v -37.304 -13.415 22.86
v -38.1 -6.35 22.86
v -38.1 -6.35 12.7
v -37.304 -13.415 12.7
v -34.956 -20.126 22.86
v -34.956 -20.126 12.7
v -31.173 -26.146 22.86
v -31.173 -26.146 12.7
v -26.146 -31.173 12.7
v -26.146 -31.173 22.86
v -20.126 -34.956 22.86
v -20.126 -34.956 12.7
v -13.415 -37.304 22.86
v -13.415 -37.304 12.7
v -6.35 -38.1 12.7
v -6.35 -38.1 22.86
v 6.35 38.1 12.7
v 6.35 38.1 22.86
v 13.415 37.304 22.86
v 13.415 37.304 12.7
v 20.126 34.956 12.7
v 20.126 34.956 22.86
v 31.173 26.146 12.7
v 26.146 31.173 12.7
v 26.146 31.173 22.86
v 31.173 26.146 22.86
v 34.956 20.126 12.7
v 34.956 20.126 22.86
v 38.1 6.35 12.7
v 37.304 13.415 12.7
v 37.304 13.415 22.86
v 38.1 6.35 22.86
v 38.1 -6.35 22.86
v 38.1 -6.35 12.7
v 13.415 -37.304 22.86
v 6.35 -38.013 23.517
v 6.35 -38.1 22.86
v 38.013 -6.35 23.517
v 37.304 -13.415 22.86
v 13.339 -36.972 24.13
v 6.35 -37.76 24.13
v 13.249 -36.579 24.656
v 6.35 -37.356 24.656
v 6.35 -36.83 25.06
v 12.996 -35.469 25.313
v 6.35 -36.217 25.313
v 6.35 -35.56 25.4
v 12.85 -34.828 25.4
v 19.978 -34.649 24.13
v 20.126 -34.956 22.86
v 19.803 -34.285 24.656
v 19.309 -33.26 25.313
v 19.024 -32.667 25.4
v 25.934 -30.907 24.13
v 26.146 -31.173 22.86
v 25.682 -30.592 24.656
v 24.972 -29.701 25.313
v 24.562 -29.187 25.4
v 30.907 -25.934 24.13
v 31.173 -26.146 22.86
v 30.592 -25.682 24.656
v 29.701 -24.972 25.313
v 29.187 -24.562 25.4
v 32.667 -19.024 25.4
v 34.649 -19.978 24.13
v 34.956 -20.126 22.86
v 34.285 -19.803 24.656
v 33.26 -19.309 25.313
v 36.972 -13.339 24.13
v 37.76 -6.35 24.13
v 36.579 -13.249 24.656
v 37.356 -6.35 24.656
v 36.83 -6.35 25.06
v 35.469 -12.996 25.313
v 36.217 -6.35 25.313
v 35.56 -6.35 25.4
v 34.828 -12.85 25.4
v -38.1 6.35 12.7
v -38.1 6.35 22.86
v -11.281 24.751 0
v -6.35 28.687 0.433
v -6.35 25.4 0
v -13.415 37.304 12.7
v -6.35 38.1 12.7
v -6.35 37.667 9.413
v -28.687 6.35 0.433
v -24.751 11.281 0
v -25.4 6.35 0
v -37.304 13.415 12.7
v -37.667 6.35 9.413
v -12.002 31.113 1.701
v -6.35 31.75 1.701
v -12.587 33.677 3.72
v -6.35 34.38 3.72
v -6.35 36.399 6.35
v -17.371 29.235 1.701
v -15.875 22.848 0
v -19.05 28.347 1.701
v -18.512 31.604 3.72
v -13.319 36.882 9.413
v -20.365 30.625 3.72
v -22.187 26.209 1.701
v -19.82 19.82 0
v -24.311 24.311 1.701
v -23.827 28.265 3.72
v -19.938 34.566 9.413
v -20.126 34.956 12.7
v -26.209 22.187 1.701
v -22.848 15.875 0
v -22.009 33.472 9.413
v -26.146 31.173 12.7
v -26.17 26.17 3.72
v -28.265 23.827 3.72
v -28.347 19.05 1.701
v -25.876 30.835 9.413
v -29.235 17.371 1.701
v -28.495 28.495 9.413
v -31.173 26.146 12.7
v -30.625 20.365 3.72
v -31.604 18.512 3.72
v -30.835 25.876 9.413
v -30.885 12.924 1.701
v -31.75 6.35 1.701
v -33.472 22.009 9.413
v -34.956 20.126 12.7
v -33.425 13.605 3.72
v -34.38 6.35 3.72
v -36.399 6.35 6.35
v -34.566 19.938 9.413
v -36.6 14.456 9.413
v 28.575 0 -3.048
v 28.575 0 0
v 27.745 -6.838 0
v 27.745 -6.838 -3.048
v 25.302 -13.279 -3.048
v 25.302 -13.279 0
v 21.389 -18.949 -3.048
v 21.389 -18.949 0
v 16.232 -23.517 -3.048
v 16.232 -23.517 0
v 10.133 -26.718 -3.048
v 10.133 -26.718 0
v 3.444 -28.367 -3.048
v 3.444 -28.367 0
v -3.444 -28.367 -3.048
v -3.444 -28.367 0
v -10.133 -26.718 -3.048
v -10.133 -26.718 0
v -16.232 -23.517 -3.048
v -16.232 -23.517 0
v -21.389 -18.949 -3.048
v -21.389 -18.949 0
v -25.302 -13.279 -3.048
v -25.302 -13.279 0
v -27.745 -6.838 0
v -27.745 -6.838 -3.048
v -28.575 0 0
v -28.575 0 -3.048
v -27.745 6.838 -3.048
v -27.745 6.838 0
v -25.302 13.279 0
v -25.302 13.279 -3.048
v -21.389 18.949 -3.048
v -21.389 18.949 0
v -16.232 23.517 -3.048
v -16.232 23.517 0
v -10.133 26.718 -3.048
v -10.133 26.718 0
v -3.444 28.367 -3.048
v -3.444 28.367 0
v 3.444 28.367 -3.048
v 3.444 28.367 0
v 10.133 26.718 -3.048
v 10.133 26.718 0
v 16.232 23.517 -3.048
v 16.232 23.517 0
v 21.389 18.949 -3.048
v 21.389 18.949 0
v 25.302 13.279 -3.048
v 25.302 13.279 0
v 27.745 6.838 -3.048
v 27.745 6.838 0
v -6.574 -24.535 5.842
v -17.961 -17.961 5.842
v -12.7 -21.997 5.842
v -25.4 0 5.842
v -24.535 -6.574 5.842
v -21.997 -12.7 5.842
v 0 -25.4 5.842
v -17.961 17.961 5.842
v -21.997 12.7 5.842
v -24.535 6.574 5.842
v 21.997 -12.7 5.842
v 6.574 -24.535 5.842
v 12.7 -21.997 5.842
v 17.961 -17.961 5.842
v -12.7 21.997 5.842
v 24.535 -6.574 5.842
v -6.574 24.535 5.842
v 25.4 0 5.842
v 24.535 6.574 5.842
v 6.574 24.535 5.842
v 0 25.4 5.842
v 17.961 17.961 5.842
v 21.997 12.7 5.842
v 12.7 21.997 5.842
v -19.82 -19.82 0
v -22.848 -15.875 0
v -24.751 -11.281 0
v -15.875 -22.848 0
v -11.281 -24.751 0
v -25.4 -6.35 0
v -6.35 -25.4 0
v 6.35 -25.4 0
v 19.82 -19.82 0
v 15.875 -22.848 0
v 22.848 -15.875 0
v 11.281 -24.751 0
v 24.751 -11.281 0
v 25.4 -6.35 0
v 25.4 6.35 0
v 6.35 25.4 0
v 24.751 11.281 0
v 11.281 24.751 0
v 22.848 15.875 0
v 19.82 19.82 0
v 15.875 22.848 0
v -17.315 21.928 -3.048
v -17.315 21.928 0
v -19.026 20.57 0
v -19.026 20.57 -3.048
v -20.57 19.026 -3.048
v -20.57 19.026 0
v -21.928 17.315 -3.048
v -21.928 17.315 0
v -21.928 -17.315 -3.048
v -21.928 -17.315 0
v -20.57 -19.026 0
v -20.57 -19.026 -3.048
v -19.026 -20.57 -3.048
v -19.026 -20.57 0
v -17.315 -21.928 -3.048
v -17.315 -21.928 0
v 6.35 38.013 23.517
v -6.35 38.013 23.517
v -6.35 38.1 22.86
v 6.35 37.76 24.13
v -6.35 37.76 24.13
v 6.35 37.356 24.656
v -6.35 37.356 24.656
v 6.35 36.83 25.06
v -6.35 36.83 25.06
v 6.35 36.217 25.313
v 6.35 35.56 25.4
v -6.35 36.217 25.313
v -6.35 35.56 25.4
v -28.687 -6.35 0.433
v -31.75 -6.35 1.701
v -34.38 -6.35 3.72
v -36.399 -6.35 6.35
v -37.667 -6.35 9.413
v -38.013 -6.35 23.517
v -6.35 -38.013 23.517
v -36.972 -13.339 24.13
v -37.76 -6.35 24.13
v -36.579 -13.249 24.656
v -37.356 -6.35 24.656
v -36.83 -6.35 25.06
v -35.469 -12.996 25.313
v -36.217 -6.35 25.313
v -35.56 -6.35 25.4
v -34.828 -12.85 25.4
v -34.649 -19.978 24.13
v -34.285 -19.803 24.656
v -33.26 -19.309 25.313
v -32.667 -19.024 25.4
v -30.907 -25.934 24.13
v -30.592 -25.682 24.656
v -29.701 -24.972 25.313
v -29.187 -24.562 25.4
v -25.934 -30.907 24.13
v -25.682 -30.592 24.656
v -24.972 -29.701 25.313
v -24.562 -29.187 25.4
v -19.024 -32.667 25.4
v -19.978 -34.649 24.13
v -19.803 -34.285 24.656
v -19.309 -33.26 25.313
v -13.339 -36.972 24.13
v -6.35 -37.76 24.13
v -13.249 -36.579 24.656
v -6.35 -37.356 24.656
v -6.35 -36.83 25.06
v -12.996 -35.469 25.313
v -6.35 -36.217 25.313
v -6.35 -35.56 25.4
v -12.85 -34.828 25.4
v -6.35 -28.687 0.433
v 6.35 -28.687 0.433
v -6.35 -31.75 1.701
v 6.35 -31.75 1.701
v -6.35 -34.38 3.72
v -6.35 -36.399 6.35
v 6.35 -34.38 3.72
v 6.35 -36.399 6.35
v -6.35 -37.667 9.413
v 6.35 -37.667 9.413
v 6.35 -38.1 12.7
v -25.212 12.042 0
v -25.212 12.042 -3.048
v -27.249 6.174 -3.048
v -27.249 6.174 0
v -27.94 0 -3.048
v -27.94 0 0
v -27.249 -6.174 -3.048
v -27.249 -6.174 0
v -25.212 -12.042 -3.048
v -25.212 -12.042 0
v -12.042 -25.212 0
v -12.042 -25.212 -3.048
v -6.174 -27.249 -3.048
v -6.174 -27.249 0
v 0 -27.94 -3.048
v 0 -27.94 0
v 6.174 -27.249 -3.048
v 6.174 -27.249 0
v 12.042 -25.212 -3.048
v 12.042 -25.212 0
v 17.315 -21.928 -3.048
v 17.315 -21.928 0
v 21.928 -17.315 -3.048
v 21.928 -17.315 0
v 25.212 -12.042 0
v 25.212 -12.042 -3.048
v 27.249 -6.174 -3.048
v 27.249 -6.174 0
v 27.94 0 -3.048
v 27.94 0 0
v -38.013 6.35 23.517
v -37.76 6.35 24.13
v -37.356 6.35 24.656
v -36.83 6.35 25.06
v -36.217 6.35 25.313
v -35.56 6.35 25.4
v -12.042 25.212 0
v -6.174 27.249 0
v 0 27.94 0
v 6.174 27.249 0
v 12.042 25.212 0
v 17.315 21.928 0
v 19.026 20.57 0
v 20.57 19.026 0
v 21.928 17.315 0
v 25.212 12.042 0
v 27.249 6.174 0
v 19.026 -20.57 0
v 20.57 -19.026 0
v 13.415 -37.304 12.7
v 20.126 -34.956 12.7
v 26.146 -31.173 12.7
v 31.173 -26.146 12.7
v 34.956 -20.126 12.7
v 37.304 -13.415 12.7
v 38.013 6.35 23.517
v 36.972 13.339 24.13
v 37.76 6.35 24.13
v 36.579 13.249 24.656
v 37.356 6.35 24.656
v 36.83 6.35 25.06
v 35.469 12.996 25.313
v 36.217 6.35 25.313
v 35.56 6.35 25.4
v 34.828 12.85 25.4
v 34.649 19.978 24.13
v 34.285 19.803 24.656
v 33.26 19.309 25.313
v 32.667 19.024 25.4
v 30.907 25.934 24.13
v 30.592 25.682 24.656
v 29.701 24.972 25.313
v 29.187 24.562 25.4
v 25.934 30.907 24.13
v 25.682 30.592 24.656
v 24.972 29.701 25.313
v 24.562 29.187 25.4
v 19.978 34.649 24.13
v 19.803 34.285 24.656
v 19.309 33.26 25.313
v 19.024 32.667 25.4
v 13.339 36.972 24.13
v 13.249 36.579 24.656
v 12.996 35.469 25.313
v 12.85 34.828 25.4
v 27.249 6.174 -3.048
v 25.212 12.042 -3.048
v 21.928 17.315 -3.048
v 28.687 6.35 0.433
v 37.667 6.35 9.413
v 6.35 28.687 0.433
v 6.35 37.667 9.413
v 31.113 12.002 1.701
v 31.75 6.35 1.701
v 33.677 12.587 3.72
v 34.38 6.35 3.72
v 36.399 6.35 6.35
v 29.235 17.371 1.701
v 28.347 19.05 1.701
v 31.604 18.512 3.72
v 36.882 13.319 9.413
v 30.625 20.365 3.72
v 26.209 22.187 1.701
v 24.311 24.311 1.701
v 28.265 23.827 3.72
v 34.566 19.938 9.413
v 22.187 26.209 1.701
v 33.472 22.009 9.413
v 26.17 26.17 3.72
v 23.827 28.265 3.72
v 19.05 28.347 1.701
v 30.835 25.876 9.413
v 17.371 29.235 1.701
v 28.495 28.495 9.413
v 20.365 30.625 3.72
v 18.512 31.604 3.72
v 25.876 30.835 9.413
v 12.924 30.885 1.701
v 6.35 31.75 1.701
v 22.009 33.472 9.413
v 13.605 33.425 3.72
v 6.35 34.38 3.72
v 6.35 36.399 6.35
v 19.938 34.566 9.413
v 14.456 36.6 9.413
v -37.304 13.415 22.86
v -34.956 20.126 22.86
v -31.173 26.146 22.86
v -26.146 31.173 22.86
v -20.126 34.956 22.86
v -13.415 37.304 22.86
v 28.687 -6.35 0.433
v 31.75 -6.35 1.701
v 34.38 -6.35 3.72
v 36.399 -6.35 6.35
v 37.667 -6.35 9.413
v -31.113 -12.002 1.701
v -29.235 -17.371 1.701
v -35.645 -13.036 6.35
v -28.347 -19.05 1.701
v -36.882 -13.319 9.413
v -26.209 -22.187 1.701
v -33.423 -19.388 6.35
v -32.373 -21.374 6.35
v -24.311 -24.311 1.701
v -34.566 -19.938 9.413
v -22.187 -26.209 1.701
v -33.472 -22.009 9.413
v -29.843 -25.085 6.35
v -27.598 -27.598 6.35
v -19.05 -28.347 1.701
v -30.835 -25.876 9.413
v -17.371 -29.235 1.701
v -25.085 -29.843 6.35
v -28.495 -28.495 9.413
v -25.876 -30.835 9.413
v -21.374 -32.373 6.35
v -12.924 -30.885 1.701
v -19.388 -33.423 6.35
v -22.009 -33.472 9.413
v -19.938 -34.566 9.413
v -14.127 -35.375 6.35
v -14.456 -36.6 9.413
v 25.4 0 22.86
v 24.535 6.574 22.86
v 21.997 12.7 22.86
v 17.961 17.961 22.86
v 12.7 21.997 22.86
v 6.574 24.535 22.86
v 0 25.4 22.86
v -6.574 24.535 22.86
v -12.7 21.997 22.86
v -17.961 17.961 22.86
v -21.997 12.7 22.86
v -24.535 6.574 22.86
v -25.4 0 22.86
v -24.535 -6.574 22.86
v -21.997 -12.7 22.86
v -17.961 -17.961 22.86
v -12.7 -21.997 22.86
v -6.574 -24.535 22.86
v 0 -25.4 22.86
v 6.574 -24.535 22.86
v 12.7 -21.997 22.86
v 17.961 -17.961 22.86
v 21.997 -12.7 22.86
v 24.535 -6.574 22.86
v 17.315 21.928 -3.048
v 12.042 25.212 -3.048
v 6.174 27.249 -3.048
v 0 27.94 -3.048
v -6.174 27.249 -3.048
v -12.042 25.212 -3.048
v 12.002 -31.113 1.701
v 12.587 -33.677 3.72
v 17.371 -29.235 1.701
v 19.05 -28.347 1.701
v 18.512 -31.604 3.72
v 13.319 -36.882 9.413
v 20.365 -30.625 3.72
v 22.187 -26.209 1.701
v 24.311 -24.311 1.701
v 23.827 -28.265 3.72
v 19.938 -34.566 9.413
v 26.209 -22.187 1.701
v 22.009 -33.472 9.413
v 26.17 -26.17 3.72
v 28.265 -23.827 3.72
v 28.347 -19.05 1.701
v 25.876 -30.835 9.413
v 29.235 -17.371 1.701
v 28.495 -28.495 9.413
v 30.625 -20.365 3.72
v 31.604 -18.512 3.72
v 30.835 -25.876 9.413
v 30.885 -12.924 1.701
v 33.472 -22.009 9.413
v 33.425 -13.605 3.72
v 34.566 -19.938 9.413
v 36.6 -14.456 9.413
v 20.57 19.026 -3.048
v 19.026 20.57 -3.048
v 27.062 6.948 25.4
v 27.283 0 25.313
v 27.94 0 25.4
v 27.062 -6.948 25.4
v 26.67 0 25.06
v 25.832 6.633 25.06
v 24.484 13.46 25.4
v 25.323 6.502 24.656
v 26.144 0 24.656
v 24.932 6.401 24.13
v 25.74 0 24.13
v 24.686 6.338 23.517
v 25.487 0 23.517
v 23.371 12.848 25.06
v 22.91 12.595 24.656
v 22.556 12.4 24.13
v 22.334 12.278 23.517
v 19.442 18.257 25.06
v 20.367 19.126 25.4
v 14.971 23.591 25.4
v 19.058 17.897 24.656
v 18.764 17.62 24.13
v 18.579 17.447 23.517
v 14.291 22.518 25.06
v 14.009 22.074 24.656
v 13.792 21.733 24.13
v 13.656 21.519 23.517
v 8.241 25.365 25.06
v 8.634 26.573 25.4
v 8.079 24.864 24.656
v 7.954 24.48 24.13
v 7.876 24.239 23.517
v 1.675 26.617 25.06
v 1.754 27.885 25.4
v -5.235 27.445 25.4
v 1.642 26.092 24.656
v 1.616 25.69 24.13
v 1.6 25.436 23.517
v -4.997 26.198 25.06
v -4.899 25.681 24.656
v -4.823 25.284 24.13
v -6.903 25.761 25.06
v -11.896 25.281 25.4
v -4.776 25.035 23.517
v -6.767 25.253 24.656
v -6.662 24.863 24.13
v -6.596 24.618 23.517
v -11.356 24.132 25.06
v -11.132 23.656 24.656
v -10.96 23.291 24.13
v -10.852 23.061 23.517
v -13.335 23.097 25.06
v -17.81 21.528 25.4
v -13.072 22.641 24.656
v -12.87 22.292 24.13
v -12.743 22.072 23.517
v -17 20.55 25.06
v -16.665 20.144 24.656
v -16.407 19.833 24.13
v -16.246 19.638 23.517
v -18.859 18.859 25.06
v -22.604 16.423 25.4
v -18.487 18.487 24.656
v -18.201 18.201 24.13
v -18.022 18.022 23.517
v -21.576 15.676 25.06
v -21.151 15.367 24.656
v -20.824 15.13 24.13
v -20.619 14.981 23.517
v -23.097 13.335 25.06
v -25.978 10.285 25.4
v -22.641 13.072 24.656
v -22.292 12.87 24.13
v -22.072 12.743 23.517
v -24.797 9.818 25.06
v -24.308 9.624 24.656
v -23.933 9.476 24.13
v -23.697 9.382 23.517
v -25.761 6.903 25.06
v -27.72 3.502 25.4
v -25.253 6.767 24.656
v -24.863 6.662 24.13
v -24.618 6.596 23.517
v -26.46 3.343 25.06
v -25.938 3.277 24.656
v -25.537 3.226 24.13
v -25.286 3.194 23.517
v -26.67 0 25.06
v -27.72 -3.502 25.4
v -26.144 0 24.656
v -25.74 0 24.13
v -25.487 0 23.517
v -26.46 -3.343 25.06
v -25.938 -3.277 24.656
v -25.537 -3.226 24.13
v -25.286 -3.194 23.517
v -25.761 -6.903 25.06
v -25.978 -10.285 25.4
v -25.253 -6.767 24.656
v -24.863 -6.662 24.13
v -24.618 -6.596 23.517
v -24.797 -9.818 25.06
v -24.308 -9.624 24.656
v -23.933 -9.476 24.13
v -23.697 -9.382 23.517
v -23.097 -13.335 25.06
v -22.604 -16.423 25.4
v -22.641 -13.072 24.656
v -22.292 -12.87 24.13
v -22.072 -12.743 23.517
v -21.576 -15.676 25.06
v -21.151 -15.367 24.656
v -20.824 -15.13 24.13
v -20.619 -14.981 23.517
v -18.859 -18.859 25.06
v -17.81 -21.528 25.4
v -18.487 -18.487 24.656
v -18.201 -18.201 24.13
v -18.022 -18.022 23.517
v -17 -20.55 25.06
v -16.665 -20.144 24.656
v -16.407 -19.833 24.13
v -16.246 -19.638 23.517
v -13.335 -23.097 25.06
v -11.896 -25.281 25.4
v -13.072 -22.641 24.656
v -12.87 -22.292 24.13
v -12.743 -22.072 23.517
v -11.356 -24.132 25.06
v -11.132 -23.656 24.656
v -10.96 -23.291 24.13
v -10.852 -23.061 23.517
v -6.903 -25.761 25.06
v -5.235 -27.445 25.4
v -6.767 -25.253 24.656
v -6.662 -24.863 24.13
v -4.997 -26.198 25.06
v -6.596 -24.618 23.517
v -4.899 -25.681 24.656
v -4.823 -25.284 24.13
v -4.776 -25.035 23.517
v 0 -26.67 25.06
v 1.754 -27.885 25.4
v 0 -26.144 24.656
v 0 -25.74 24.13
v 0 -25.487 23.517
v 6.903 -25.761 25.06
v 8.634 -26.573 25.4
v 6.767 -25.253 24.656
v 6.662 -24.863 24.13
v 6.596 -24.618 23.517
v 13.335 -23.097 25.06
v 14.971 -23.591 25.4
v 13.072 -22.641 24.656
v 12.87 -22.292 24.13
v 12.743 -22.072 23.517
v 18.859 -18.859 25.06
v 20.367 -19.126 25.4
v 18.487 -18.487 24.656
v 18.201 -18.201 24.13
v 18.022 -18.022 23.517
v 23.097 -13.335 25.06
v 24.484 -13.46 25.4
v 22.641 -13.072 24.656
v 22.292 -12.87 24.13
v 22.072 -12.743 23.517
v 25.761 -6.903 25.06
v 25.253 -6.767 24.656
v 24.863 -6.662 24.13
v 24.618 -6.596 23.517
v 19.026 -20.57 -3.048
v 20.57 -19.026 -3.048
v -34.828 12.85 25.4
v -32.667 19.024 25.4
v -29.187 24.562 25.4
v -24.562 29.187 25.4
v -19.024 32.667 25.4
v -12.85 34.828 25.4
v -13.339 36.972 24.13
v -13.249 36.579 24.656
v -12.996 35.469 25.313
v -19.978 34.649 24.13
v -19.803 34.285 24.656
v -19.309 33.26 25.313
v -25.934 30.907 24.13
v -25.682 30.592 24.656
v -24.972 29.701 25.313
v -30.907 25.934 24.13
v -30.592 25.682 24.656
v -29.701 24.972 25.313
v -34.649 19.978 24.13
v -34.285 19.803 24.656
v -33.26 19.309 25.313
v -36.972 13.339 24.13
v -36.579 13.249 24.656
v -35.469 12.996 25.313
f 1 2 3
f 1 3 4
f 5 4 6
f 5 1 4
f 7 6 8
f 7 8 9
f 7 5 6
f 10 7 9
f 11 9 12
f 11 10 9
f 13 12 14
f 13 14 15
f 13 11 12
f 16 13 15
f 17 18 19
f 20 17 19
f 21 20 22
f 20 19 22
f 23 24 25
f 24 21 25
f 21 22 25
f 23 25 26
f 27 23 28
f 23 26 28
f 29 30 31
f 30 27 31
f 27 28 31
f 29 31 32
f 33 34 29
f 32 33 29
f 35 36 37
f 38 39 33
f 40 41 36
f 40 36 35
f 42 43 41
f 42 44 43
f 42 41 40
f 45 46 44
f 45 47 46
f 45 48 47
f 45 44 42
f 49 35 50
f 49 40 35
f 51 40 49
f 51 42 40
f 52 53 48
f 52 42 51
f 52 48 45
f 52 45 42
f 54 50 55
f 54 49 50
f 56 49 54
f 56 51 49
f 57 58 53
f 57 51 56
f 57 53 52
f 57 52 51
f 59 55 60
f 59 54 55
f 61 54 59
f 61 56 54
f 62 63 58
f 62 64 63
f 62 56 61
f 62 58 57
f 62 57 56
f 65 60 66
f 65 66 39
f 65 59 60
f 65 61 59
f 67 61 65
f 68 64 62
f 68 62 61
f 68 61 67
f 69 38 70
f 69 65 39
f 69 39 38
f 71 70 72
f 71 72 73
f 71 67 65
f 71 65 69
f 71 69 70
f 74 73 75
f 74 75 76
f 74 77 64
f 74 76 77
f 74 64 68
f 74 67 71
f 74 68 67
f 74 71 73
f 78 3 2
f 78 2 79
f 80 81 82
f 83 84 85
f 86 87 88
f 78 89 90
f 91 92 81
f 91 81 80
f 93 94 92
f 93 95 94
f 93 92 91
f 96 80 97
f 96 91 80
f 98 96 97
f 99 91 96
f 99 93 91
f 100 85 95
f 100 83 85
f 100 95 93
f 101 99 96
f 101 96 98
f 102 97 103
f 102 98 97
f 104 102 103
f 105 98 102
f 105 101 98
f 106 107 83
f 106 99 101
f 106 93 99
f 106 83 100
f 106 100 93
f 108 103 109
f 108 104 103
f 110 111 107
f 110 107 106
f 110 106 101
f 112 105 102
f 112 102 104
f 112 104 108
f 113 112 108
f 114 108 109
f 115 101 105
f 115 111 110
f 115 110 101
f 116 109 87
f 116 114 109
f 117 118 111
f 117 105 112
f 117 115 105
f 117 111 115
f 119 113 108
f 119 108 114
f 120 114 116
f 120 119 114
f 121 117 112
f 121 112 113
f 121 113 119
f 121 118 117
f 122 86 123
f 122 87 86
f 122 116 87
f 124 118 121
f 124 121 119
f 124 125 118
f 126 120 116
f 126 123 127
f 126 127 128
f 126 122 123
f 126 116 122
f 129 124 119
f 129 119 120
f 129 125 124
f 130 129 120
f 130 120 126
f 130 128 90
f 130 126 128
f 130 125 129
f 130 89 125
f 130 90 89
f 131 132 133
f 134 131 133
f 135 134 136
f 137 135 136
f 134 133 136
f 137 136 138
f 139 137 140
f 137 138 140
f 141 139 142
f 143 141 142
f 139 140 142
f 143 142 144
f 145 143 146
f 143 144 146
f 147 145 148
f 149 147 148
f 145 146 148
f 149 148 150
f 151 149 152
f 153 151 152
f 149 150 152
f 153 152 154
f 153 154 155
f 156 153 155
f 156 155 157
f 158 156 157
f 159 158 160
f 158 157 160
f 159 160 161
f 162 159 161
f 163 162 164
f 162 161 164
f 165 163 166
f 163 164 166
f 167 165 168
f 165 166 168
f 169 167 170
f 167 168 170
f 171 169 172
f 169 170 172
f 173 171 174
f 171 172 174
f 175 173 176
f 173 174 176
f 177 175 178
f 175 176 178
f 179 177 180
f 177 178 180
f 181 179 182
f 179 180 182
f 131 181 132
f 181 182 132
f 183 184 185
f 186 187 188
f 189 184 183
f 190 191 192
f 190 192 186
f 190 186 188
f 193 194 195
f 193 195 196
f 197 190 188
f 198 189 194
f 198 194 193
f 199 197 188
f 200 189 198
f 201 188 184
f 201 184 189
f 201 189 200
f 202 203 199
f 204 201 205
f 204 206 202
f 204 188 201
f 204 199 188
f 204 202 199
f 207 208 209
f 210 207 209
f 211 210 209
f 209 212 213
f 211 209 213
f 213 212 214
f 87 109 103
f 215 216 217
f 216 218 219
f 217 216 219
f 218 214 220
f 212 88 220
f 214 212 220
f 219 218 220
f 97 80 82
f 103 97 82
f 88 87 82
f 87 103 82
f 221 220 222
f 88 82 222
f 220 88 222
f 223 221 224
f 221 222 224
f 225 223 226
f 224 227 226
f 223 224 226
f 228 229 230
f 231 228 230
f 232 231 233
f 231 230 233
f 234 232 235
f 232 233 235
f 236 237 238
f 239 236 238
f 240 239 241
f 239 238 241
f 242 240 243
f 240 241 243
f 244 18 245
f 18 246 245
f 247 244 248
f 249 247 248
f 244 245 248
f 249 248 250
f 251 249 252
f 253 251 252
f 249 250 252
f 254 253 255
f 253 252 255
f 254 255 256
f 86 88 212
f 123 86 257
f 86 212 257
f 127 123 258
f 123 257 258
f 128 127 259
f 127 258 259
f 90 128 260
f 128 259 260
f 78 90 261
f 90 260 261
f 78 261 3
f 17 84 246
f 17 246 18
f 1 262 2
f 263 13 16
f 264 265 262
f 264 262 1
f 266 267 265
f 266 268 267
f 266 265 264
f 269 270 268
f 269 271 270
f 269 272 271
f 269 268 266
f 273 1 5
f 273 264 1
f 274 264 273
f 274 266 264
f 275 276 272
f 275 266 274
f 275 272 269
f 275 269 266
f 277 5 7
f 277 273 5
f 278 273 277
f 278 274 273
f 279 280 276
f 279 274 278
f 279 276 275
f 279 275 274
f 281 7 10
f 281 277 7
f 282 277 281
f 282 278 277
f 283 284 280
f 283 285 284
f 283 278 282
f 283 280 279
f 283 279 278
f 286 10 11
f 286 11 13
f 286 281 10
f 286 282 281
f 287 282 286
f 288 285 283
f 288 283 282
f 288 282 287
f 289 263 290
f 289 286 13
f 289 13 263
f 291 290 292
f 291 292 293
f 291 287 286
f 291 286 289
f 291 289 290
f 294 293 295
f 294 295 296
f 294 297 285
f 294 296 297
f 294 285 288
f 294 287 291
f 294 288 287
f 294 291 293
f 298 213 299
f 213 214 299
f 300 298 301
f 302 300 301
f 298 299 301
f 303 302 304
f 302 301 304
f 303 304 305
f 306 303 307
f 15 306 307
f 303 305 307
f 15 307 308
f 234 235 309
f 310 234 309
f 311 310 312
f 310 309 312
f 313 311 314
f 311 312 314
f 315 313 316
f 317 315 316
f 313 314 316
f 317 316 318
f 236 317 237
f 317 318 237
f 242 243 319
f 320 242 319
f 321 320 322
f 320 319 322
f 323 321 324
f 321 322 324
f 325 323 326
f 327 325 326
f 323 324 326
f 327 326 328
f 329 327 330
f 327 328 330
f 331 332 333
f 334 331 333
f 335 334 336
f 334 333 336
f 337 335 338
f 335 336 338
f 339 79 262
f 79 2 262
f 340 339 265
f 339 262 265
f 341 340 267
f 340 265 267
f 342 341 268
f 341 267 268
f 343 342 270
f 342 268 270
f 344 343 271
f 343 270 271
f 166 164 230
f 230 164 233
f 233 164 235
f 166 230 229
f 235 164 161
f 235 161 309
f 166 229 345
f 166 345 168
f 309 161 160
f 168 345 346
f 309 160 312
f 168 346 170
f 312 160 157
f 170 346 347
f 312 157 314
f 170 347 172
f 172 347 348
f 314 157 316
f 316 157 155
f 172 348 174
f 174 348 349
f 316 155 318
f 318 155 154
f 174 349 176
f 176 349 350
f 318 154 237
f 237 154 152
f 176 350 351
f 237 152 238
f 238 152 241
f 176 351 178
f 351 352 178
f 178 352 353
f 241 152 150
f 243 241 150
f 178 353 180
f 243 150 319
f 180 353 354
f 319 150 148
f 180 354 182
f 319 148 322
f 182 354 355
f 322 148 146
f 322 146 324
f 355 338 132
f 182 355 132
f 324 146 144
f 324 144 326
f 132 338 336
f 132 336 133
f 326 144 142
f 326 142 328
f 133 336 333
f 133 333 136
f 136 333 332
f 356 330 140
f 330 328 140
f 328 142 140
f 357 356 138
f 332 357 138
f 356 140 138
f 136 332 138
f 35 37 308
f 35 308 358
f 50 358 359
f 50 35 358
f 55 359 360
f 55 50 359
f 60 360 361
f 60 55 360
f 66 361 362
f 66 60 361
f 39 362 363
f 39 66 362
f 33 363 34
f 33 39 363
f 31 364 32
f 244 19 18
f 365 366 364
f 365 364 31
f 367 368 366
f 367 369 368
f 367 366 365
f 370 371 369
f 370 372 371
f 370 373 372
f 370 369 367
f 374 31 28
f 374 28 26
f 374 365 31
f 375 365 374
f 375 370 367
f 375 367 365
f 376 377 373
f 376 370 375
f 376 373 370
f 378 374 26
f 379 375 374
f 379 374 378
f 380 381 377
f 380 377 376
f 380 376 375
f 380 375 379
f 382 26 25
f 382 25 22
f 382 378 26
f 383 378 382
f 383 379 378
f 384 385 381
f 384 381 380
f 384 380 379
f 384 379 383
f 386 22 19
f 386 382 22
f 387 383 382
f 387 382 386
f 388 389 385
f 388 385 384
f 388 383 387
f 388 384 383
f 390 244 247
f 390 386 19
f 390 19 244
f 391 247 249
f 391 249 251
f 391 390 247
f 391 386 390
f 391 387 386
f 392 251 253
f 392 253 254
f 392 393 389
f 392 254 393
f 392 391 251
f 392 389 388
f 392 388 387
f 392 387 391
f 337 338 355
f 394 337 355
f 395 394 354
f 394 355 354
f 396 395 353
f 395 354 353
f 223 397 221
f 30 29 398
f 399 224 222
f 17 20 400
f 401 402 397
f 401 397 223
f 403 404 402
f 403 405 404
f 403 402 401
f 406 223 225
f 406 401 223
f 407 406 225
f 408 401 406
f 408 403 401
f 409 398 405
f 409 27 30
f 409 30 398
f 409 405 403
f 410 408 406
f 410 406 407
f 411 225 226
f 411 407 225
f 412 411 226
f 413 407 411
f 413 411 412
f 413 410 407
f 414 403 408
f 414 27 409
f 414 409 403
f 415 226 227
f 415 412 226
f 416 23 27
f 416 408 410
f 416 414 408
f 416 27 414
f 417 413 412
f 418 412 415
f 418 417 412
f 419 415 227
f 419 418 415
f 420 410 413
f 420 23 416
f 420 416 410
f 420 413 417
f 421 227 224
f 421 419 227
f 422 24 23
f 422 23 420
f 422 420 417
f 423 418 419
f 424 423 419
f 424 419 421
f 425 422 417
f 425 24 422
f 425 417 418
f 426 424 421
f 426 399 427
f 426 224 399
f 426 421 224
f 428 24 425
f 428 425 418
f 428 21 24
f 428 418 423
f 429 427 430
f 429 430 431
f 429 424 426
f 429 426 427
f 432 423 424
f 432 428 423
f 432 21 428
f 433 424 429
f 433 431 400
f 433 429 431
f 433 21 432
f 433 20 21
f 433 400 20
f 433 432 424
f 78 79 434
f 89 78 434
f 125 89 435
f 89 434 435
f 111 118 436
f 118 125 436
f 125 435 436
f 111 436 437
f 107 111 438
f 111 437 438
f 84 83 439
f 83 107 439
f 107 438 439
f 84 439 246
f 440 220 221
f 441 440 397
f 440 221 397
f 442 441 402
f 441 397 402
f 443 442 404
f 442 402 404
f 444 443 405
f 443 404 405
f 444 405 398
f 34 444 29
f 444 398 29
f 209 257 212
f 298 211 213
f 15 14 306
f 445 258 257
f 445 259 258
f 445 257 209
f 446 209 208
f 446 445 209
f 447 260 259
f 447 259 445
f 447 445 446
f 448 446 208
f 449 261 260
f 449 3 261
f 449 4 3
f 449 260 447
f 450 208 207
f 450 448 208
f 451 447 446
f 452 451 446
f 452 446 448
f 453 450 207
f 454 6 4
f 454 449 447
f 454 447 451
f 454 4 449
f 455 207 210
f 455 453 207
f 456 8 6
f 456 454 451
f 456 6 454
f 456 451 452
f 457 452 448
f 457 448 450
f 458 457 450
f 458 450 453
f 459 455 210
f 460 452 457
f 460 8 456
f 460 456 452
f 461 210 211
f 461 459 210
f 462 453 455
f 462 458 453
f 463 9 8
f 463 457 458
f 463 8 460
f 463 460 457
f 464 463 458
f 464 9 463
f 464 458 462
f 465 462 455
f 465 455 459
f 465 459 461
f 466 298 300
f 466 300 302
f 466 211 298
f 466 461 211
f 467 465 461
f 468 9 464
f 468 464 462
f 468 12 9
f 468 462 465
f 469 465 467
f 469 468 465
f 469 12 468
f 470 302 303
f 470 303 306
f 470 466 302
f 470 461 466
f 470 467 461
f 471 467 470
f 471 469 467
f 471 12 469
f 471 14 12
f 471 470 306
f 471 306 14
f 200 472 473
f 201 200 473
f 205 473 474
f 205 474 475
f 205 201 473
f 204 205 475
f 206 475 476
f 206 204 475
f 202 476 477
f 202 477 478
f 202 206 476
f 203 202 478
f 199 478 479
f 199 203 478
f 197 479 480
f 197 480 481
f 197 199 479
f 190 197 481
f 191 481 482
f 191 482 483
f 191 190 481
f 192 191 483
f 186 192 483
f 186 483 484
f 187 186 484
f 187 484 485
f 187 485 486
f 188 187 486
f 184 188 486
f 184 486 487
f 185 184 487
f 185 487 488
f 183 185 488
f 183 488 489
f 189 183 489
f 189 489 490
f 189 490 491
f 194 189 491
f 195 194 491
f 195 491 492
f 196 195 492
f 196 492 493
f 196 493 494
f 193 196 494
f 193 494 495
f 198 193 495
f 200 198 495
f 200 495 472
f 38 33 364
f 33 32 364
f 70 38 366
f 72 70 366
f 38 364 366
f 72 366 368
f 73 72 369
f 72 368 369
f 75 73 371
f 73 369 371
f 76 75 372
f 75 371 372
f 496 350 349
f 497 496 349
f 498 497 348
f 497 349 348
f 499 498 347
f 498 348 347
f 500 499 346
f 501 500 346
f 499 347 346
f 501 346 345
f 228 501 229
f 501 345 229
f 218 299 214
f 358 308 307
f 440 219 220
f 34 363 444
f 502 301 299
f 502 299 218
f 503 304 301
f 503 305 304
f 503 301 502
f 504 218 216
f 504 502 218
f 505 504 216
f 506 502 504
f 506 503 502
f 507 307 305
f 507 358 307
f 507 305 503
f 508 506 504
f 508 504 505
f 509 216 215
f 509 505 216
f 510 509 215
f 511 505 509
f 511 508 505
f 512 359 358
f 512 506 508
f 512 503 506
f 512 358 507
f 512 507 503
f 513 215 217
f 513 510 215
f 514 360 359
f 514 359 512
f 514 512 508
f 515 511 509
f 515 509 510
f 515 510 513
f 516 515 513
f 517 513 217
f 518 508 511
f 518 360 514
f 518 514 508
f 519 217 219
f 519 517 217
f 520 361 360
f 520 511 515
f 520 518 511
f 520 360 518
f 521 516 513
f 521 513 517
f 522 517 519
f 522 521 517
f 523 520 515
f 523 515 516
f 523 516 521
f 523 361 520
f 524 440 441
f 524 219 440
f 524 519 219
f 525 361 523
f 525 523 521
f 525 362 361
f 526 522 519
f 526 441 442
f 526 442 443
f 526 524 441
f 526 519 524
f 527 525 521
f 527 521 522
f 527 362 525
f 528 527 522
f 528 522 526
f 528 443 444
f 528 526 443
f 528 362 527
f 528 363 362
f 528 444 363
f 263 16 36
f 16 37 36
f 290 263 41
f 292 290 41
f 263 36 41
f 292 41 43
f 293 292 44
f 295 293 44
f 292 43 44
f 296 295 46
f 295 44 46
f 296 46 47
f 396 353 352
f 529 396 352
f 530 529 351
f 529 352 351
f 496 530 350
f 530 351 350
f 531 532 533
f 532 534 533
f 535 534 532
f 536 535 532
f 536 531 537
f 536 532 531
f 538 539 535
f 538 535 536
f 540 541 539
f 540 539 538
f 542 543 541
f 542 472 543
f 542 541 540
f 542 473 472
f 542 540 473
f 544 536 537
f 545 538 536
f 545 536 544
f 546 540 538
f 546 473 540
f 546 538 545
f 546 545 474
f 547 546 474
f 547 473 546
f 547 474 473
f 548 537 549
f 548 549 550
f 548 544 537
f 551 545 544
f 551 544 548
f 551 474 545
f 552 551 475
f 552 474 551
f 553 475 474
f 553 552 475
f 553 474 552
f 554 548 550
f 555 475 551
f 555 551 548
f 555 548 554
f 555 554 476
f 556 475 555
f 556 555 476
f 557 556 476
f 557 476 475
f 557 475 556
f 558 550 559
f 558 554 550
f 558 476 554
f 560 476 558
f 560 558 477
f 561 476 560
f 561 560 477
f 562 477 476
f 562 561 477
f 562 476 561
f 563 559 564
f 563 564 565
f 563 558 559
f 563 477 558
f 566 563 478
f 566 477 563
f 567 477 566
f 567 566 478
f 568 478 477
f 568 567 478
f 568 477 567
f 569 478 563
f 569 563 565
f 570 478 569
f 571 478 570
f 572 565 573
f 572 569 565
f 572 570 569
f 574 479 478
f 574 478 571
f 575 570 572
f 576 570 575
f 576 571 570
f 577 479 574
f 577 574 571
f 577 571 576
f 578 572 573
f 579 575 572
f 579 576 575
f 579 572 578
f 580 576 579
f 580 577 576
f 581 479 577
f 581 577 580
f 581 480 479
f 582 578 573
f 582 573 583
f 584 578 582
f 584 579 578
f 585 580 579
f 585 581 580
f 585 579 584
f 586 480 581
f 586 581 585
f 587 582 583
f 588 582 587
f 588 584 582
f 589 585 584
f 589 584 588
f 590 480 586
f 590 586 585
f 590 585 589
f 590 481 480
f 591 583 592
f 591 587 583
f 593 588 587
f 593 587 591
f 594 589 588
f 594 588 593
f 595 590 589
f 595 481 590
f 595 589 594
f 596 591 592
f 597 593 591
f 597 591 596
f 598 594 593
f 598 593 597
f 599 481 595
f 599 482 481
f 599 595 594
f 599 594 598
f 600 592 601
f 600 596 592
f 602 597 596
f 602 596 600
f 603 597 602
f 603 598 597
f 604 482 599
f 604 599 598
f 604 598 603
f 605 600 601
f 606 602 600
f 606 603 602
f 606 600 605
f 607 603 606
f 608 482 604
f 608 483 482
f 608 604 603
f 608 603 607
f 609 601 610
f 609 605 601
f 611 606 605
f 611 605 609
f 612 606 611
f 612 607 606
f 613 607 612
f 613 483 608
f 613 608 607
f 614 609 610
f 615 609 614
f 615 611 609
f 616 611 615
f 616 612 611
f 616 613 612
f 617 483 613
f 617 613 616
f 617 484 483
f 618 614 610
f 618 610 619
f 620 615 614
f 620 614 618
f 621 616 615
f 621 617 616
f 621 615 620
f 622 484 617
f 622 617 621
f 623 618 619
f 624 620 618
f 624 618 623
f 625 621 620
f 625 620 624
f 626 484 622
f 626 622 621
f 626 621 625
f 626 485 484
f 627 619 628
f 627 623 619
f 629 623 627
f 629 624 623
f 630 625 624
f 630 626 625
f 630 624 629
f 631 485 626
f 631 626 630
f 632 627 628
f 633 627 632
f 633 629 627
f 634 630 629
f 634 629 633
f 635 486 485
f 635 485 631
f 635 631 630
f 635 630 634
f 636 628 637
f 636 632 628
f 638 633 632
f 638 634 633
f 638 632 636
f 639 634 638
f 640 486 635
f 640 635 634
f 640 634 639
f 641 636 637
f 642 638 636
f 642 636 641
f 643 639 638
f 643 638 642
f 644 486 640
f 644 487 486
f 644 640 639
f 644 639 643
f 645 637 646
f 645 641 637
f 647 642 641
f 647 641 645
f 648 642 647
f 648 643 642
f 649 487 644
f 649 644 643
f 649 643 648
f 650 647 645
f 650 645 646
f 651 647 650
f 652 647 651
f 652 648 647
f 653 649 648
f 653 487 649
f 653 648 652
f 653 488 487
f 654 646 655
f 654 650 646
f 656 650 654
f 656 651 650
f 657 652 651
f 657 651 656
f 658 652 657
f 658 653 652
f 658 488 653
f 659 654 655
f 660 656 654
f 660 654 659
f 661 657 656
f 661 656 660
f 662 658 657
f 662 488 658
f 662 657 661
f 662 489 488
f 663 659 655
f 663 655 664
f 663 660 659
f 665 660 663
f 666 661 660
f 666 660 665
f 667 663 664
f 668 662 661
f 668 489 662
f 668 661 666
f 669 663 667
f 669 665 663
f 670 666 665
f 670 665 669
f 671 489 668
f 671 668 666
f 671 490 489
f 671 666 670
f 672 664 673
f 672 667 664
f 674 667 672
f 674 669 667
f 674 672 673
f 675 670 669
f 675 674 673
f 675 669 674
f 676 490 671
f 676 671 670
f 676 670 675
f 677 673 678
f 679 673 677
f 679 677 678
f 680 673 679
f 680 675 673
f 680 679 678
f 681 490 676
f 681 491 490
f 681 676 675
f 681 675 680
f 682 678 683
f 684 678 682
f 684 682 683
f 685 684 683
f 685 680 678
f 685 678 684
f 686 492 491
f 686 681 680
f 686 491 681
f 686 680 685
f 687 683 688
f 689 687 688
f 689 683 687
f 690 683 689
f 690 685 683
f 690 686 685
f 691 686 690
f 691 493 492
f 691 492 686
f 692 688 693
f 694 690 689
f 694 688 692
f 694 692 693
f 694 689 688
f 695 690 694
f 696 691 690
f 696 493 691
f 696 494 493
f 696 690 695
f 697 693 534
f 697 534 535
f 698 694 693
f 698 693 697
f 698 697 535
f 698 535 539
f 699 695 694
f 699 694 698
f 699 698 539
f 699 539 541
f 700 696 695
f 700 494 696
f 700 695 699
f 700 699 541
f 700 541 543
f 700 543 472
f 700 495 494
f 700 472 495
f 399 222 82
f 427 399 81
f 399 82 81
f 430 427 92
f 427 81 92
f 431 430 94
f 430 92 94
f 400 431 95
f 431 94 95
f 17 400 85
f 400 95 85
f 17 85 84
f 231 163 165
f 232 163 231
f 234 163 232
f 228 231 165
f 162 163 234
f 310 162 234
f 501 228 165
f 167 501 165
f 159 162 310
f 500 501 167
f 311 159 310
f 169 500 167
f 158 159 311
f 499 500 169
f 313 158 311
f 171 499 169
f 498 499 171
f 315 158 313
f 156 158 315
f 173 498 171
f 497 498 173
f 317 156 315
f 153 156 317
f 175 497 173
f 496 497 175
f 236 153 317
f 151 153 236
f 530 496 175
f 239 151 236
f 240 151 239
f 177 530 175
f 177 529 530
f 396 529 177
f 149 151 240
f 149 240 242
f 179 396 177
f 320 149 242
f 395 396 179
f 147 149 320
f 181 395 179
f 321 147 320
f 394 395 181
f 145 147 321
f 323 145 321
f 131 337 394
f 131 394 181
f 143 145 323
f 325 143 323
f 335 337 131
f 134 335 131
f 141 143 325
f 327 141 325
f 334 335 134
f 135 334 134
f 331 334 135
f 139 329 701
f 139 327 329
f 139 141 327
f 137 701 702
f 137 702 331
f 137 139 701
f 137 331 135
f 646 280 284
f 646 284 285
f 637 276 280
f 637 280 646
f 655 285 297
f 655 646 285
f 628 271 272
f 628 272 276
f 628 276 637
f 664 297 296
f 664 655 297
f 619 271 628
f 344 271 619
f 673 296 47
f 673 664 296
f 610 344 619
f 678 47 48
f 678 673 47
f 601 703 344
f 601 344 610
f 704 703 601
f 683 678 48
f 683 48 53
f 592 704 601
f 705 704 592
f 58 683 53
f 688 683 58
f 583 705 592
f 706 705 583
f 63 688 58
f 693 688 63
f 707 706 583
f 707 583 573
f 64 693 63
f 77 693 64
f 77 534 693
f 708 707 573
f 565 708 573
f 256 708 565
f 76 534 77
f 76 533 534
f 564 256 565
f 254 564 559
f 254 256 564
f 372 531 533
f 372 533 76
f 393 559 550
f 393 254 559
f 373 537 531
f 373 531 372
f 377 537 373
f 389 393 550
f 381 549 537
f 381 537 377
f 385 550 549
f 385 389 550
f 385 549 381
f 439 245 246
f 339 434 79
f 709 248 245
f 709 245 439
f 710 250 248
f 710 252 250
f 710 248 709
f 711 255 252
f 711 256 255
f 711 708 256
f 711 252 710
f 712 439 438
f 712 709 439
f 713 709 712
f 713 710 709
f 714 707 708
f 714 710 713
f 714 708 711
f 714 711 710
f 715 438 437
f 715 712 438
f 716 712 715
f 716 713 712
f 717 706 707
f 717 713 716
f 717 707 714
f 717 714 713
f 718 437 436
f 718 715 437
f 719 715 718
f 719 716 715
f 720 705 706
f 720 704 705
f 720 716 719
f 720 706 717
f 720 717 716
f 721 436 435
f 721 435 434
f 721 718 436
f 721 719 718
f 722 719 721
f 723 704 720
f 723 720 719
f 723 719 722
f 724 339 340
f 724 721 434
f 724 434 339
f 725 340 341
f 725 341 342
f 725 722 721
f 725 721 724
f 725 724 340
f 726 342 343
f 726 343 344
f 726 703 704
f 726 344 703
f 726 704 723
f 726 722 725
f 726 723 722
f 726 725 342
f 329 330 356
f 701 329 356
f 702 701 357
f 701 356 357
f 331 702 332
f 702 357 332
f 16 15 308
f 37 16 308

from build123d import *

# Parameters (mm, degrees)
F0_W     = 76.2
F0_H     = 76.2
F0_R     = 25.4
F1_DEPTH = 25.4
F2_DEPTH = 5.842
F3_R     = 31.75
F4_R     = 12.7
F5_R     = 2.54
F6_R     = 28.575
F7_DEPTH = 3.048


with BuildPart() as f1:
    # F0 (on Top) → F1 (new body)
    with BuildSketch(Plane.XY):
        Rectangle(F0_W, F0_H)
        Circle(F0_R, mode=Mode.SUBTRACT)
    extrude(amount=F1_DEPTH)

    # F0 (on Top) → F2 (join)
    with BuildSketch(Plane.XY):
        Circle(F0_R)
    extrude(amount=F2_DEPTH)

    # F3
    f3_edges = [f1.edges().sort_by_distance(p)[0] for p in [
        (38.1, 38.1, 12.7),
        (-38.1, 38.1, 12.7),
        (-38.1, -38.1, 12.7),
        (38.1, -38.1, 12.7),
    ]]
    fillet(f3_edges, radius=F3_R)

    # F4
    f4_edges = [f1.edges().sort_by_distance(p)[0] for p in [
        (0, -38.1, 0),
        (-28.80064, -28.80064, 0),
        (28.80064, -28.80064, 0),
        (-38.1, 0, 0),
        (38.1, 0, 0),
        (-28.80064, 28.80064, 0),
        (28.80064, 28.80064, 0),
        (0, 38.1, 0),
    ]]
    fillet(f4_edges, radius=F4_R)

    # F5
    f5_edges = [f1.edges().sort_by_distance(p)[0] for p in [
        (0, -38.1, 25.4),
        (-28.80064, -28.80064, 25.4),
        (28.80064, -28.80064, 25.4),
        (-38.1, 0, 25.4),
        (38.1, 0, 25.4),
        (-28.80064, 28.80064, 25.4),
        (28.80064, 28.80064, 25.4),
        (0, 38.1, 25.4),
        (-25.4, 0, 25.4),
    ]]
    fillet(f5_edges, radius=F5_R)


with BuildPart() as f7:
    # F6 (on face) → F7 (new body)
    with BuildSketch(Plane(origin=(0, 0, 0), x_dir=(1, 0, 0), z_dir=(0, 0, -1))):
        Circle(F6_R)
        with BuildLine():
            ThreePointArc((21.9276955143, 17.3153044857), (26.394160459, 9.1647091425), (27.94, 0))
            ThreePointArc((27.94, 0), (26.394160459, -9.1647091425), (21.9276955143, -17.3153044857))
            ThreePointArc((21.9276955143, -17.3153044857), (19.8203841816, -19.8203841816), (17.3153044857, -21.9276955143))
            ThreePointArc((17.3153044857, -21.9276955143), (0, -27.94), (-17.3153044857, -21.9276955143))
            ThreePointArc((-17.3153044857, -21.9276955143), (-19.8203841816, -19.8203841816), (-21.9276955143, -17.3153044857))
            ThreePointArc((-21.9276955143, -17.3153044857), (-27.94, 0), (-21.9276955143, 17.3153044857))
            ThreePointArc((-21.9276955143, 17.3153044857), (-19.8203841816, 19.8203841816), (-17.3153044857, 21.9276955143))
            ThreePointArc((-17.3153044857, 21.9276955143), (0, 27.94), (17.3153044857, 21.9276955143))
            ThreePointArc((17.3153044857, 21.9276955143), (19.8203841816, 19.8203841816), (21.9276955143, 17.3153044857))
        make_face(mode=Mode.SUBTRACT)
    extrude(amount=F7_DEPTH)


solid = Compound([f1.part, f7.part])
